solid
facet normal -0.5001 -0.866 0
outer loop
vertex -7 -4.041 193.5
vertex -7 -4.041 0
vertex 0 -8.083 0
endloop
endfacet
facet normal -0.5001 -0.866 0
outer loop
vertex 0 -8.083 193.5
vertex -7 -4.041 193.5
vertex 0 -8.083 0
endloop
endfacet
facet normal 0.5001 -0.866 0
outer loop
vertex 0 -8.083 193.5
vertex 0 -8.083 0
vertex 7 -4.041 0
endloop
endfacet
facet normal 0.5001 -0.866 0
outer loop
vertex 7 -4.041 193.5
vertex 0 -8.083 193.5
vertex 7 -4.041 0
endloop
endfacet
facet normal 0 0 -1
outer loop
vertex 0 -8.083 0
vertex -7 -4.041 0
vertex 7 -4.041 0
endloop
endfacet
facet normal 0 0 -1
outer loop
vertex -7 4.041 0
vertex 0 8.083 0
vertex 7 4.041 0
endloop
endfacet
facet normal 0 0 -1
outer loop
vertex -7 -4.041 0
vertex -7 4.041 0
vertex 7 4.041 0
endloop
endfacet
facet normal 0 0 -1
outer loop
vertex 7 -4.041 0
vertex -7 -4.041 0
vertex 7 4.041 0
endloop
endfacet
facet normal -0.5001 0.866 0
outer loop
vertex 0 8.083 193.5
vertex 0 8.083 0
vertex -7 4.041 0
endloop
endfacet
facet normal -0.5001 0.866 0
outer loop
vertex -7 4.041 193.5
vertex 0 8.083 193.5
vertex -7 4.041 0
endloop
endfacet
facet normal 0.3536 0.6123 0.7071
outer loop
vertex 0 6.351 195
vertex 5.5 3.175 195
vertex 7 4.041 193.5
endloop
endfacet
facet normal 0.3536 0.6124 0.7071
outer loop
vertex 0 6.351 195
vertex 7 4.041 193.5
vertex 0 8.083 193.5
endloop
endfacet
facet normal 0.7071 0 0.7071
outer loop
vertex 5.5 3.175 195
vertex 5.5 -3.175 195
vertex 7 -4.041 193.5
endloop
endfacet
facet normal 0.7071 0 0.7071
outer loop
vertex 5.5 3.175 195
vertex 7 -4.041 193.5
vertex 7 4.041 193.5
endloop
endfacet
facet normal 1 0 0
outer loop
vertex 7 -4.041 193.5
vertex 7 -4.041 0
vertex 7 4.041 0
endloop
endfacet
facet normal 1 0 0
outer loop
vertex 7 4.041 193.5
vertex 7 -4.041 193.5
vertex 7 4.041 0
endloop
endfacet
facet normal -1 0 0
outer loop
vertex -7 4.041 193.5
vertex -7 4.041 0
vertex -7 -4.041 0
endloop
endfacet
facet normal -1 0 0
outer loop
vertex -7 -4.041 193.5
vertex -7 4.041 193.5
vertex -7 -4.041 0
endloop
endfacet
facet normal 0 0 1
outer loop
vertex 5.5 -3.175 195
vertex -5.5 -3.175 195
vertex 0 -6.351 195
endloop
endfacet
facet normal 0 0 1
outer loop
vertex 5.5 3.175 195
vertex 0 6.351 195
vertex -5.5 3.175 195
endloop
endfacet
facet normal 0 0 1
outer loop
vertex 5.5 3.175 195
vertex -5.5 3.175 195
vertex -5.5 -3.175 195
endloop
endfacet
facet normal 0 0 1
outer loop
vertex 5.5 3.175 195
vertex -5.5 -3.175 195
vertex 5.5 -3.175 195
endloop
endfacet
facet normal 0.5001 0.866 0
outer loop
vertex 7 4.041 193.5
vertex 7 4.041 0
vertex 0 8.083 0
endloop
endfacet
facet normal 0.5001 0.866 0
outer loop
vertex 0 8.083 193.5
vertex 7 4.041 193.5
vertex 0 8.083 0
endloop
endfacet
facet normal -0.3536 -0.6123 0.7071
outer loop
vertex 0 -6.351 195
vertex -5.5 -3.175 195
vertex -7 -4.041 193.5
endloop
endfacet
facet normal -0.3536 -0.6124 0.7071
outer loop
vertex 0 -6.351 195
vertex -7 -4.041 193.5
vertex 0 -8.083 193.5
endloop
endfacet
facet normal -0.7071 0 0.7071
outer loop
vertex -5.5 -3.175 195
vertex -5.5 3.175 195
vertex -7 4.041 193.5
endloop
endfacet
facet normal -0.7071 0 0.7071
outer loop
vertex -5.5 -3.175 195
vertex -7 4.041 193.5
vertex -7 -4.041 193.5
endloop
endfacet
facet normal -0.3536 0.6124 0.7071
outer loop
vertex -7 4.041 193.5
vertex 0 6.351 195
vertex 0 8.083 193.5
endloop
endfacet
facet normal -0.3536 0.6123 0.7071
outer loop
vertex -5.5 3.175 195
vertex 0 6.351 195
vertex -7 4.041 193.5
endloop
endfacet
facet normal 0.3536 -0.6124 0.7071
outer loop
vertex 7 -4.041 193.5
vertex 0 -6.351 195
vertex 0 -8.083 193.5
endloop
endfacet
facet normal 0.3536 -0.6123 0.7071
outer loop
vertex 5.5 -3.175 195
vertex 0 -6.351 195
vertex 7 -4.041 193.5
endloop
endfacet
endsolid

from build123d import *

# Parameters (mm, degrees)
F1_DEPTH = 195
F2_SIZE  = 1.5


with BuildPart() as f1:
    # F0 (on Top) → F1 (new body)
    with BuildSketch(Plane.XY):
        Polygon((7, -4.041452), (7, 4.041452), (0, 8.082904), (-7, 4.041452), (-7, -4.041452), (0, -8.082904), align=None)
    extrude(amount=F1_DEPTH)

    # F2
    f2_edges = [f1.edges().sort_by_distance(p)[0] for p in [
        (-3.5, -6.062178, 195),
        (3.5, -6.062178, 195),
        (7, 0, 195),
        (3.5, 6.062178, 195),
        (-3.5, 6.062178, 195),
        (-7, 0, 195),
    ]]
    chamfer(f2_edges, length=F2_SIZE)


solid = f1.part
